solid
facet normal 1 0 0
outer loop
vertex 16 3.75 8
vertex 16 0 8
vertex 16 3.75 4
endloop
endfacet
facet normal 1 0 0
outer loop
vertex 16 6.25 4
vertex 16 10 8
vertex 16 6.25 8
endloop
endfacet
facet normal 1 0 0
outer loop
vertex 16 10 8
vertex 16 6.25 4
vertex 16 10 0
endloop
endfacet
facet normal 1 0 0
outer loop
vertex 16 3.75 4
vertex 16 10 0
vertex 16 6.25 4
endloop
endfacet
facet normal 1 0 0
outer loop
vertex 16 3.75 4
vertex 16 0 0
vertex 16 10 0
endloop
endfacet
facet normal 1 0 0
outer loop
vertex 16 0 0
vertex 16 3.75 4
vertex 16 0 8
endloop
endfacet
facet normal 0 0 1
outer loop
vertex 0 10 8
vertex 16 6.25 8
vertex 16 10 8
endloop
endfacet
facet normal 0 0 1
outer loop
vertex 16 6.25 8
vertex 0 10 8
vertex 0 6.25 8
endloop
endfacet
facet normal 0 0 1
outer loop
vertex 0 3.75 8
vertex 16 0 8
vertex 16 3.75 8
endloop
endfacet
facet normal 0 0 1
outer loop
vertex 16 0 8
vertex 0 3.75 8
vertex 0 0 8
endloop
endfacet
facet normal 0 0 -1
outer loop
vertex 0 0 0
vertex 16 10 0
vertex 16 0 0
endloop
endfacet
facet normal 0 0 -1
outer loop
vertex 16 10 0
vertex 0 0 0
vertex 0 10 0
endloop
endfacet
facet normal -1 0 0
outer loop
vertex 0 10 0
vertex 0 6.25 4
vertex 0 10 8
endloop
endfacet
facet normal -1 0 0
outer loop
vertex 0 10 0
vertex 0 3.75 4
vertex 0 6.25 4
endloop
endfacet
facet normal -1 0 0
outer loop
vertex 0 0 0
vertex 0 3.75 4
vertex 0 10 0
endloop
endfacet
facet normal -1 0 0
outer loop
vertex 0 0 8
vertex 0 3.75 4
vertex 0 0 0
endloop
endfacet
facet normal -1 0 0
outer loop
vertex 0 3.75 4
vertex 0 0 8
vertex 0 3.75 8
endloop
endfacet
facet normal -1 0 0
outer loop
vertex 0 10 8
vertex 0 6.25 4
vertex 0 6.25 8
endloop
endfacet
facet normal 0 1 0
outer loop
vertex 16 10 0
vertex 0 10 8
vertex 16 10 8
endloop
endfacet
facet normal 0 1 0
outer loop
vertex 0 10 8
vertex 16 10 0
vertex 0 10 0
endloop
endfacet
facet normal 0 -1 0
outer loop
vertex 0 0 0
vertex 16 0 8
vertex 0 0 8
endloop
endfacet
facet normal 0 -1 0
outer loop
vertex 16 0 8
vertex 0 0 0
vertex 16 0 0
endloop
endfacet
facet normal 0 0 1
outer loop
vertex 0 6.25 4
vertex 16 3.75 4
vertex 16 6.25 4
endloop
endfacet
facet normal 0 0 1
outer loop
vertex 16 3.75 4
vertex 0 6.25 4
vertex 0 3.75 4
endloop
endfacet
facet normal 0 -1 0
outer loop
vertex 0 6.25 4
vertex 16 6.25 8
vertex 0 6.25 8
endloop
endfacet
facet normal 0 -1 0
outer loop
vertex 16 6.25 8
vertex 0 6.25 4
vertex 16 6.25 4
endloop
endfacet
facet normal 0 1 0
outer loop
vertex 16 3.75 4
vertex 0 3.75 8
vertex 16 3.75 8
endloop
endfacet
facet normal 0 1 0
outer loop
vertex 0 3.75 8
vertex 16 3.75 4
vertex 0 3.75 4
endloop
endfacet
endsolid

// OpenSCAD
$fn = 32;

// ----------------------------------------------------------------------
// Micro clip: slotted block, 5-20 mm class
// ----------------------------------------------------------------------

// --- parameters (mm) ---
block_l = 16;             // block length, X
block_w = 10;             // block width, Y
block_h = 8;              // block height, Z
slot_w = 2.5;             // slot width
slot_d = 4;               // slot depth from the top

difference() {
  cube([block_l, block_w, block_h]);
  translate([-1, block_w / 2 - slot_w / 2, block_h - slot_d])
    cube([block_l + 2, slot_w, slot_d + 1]);
}
